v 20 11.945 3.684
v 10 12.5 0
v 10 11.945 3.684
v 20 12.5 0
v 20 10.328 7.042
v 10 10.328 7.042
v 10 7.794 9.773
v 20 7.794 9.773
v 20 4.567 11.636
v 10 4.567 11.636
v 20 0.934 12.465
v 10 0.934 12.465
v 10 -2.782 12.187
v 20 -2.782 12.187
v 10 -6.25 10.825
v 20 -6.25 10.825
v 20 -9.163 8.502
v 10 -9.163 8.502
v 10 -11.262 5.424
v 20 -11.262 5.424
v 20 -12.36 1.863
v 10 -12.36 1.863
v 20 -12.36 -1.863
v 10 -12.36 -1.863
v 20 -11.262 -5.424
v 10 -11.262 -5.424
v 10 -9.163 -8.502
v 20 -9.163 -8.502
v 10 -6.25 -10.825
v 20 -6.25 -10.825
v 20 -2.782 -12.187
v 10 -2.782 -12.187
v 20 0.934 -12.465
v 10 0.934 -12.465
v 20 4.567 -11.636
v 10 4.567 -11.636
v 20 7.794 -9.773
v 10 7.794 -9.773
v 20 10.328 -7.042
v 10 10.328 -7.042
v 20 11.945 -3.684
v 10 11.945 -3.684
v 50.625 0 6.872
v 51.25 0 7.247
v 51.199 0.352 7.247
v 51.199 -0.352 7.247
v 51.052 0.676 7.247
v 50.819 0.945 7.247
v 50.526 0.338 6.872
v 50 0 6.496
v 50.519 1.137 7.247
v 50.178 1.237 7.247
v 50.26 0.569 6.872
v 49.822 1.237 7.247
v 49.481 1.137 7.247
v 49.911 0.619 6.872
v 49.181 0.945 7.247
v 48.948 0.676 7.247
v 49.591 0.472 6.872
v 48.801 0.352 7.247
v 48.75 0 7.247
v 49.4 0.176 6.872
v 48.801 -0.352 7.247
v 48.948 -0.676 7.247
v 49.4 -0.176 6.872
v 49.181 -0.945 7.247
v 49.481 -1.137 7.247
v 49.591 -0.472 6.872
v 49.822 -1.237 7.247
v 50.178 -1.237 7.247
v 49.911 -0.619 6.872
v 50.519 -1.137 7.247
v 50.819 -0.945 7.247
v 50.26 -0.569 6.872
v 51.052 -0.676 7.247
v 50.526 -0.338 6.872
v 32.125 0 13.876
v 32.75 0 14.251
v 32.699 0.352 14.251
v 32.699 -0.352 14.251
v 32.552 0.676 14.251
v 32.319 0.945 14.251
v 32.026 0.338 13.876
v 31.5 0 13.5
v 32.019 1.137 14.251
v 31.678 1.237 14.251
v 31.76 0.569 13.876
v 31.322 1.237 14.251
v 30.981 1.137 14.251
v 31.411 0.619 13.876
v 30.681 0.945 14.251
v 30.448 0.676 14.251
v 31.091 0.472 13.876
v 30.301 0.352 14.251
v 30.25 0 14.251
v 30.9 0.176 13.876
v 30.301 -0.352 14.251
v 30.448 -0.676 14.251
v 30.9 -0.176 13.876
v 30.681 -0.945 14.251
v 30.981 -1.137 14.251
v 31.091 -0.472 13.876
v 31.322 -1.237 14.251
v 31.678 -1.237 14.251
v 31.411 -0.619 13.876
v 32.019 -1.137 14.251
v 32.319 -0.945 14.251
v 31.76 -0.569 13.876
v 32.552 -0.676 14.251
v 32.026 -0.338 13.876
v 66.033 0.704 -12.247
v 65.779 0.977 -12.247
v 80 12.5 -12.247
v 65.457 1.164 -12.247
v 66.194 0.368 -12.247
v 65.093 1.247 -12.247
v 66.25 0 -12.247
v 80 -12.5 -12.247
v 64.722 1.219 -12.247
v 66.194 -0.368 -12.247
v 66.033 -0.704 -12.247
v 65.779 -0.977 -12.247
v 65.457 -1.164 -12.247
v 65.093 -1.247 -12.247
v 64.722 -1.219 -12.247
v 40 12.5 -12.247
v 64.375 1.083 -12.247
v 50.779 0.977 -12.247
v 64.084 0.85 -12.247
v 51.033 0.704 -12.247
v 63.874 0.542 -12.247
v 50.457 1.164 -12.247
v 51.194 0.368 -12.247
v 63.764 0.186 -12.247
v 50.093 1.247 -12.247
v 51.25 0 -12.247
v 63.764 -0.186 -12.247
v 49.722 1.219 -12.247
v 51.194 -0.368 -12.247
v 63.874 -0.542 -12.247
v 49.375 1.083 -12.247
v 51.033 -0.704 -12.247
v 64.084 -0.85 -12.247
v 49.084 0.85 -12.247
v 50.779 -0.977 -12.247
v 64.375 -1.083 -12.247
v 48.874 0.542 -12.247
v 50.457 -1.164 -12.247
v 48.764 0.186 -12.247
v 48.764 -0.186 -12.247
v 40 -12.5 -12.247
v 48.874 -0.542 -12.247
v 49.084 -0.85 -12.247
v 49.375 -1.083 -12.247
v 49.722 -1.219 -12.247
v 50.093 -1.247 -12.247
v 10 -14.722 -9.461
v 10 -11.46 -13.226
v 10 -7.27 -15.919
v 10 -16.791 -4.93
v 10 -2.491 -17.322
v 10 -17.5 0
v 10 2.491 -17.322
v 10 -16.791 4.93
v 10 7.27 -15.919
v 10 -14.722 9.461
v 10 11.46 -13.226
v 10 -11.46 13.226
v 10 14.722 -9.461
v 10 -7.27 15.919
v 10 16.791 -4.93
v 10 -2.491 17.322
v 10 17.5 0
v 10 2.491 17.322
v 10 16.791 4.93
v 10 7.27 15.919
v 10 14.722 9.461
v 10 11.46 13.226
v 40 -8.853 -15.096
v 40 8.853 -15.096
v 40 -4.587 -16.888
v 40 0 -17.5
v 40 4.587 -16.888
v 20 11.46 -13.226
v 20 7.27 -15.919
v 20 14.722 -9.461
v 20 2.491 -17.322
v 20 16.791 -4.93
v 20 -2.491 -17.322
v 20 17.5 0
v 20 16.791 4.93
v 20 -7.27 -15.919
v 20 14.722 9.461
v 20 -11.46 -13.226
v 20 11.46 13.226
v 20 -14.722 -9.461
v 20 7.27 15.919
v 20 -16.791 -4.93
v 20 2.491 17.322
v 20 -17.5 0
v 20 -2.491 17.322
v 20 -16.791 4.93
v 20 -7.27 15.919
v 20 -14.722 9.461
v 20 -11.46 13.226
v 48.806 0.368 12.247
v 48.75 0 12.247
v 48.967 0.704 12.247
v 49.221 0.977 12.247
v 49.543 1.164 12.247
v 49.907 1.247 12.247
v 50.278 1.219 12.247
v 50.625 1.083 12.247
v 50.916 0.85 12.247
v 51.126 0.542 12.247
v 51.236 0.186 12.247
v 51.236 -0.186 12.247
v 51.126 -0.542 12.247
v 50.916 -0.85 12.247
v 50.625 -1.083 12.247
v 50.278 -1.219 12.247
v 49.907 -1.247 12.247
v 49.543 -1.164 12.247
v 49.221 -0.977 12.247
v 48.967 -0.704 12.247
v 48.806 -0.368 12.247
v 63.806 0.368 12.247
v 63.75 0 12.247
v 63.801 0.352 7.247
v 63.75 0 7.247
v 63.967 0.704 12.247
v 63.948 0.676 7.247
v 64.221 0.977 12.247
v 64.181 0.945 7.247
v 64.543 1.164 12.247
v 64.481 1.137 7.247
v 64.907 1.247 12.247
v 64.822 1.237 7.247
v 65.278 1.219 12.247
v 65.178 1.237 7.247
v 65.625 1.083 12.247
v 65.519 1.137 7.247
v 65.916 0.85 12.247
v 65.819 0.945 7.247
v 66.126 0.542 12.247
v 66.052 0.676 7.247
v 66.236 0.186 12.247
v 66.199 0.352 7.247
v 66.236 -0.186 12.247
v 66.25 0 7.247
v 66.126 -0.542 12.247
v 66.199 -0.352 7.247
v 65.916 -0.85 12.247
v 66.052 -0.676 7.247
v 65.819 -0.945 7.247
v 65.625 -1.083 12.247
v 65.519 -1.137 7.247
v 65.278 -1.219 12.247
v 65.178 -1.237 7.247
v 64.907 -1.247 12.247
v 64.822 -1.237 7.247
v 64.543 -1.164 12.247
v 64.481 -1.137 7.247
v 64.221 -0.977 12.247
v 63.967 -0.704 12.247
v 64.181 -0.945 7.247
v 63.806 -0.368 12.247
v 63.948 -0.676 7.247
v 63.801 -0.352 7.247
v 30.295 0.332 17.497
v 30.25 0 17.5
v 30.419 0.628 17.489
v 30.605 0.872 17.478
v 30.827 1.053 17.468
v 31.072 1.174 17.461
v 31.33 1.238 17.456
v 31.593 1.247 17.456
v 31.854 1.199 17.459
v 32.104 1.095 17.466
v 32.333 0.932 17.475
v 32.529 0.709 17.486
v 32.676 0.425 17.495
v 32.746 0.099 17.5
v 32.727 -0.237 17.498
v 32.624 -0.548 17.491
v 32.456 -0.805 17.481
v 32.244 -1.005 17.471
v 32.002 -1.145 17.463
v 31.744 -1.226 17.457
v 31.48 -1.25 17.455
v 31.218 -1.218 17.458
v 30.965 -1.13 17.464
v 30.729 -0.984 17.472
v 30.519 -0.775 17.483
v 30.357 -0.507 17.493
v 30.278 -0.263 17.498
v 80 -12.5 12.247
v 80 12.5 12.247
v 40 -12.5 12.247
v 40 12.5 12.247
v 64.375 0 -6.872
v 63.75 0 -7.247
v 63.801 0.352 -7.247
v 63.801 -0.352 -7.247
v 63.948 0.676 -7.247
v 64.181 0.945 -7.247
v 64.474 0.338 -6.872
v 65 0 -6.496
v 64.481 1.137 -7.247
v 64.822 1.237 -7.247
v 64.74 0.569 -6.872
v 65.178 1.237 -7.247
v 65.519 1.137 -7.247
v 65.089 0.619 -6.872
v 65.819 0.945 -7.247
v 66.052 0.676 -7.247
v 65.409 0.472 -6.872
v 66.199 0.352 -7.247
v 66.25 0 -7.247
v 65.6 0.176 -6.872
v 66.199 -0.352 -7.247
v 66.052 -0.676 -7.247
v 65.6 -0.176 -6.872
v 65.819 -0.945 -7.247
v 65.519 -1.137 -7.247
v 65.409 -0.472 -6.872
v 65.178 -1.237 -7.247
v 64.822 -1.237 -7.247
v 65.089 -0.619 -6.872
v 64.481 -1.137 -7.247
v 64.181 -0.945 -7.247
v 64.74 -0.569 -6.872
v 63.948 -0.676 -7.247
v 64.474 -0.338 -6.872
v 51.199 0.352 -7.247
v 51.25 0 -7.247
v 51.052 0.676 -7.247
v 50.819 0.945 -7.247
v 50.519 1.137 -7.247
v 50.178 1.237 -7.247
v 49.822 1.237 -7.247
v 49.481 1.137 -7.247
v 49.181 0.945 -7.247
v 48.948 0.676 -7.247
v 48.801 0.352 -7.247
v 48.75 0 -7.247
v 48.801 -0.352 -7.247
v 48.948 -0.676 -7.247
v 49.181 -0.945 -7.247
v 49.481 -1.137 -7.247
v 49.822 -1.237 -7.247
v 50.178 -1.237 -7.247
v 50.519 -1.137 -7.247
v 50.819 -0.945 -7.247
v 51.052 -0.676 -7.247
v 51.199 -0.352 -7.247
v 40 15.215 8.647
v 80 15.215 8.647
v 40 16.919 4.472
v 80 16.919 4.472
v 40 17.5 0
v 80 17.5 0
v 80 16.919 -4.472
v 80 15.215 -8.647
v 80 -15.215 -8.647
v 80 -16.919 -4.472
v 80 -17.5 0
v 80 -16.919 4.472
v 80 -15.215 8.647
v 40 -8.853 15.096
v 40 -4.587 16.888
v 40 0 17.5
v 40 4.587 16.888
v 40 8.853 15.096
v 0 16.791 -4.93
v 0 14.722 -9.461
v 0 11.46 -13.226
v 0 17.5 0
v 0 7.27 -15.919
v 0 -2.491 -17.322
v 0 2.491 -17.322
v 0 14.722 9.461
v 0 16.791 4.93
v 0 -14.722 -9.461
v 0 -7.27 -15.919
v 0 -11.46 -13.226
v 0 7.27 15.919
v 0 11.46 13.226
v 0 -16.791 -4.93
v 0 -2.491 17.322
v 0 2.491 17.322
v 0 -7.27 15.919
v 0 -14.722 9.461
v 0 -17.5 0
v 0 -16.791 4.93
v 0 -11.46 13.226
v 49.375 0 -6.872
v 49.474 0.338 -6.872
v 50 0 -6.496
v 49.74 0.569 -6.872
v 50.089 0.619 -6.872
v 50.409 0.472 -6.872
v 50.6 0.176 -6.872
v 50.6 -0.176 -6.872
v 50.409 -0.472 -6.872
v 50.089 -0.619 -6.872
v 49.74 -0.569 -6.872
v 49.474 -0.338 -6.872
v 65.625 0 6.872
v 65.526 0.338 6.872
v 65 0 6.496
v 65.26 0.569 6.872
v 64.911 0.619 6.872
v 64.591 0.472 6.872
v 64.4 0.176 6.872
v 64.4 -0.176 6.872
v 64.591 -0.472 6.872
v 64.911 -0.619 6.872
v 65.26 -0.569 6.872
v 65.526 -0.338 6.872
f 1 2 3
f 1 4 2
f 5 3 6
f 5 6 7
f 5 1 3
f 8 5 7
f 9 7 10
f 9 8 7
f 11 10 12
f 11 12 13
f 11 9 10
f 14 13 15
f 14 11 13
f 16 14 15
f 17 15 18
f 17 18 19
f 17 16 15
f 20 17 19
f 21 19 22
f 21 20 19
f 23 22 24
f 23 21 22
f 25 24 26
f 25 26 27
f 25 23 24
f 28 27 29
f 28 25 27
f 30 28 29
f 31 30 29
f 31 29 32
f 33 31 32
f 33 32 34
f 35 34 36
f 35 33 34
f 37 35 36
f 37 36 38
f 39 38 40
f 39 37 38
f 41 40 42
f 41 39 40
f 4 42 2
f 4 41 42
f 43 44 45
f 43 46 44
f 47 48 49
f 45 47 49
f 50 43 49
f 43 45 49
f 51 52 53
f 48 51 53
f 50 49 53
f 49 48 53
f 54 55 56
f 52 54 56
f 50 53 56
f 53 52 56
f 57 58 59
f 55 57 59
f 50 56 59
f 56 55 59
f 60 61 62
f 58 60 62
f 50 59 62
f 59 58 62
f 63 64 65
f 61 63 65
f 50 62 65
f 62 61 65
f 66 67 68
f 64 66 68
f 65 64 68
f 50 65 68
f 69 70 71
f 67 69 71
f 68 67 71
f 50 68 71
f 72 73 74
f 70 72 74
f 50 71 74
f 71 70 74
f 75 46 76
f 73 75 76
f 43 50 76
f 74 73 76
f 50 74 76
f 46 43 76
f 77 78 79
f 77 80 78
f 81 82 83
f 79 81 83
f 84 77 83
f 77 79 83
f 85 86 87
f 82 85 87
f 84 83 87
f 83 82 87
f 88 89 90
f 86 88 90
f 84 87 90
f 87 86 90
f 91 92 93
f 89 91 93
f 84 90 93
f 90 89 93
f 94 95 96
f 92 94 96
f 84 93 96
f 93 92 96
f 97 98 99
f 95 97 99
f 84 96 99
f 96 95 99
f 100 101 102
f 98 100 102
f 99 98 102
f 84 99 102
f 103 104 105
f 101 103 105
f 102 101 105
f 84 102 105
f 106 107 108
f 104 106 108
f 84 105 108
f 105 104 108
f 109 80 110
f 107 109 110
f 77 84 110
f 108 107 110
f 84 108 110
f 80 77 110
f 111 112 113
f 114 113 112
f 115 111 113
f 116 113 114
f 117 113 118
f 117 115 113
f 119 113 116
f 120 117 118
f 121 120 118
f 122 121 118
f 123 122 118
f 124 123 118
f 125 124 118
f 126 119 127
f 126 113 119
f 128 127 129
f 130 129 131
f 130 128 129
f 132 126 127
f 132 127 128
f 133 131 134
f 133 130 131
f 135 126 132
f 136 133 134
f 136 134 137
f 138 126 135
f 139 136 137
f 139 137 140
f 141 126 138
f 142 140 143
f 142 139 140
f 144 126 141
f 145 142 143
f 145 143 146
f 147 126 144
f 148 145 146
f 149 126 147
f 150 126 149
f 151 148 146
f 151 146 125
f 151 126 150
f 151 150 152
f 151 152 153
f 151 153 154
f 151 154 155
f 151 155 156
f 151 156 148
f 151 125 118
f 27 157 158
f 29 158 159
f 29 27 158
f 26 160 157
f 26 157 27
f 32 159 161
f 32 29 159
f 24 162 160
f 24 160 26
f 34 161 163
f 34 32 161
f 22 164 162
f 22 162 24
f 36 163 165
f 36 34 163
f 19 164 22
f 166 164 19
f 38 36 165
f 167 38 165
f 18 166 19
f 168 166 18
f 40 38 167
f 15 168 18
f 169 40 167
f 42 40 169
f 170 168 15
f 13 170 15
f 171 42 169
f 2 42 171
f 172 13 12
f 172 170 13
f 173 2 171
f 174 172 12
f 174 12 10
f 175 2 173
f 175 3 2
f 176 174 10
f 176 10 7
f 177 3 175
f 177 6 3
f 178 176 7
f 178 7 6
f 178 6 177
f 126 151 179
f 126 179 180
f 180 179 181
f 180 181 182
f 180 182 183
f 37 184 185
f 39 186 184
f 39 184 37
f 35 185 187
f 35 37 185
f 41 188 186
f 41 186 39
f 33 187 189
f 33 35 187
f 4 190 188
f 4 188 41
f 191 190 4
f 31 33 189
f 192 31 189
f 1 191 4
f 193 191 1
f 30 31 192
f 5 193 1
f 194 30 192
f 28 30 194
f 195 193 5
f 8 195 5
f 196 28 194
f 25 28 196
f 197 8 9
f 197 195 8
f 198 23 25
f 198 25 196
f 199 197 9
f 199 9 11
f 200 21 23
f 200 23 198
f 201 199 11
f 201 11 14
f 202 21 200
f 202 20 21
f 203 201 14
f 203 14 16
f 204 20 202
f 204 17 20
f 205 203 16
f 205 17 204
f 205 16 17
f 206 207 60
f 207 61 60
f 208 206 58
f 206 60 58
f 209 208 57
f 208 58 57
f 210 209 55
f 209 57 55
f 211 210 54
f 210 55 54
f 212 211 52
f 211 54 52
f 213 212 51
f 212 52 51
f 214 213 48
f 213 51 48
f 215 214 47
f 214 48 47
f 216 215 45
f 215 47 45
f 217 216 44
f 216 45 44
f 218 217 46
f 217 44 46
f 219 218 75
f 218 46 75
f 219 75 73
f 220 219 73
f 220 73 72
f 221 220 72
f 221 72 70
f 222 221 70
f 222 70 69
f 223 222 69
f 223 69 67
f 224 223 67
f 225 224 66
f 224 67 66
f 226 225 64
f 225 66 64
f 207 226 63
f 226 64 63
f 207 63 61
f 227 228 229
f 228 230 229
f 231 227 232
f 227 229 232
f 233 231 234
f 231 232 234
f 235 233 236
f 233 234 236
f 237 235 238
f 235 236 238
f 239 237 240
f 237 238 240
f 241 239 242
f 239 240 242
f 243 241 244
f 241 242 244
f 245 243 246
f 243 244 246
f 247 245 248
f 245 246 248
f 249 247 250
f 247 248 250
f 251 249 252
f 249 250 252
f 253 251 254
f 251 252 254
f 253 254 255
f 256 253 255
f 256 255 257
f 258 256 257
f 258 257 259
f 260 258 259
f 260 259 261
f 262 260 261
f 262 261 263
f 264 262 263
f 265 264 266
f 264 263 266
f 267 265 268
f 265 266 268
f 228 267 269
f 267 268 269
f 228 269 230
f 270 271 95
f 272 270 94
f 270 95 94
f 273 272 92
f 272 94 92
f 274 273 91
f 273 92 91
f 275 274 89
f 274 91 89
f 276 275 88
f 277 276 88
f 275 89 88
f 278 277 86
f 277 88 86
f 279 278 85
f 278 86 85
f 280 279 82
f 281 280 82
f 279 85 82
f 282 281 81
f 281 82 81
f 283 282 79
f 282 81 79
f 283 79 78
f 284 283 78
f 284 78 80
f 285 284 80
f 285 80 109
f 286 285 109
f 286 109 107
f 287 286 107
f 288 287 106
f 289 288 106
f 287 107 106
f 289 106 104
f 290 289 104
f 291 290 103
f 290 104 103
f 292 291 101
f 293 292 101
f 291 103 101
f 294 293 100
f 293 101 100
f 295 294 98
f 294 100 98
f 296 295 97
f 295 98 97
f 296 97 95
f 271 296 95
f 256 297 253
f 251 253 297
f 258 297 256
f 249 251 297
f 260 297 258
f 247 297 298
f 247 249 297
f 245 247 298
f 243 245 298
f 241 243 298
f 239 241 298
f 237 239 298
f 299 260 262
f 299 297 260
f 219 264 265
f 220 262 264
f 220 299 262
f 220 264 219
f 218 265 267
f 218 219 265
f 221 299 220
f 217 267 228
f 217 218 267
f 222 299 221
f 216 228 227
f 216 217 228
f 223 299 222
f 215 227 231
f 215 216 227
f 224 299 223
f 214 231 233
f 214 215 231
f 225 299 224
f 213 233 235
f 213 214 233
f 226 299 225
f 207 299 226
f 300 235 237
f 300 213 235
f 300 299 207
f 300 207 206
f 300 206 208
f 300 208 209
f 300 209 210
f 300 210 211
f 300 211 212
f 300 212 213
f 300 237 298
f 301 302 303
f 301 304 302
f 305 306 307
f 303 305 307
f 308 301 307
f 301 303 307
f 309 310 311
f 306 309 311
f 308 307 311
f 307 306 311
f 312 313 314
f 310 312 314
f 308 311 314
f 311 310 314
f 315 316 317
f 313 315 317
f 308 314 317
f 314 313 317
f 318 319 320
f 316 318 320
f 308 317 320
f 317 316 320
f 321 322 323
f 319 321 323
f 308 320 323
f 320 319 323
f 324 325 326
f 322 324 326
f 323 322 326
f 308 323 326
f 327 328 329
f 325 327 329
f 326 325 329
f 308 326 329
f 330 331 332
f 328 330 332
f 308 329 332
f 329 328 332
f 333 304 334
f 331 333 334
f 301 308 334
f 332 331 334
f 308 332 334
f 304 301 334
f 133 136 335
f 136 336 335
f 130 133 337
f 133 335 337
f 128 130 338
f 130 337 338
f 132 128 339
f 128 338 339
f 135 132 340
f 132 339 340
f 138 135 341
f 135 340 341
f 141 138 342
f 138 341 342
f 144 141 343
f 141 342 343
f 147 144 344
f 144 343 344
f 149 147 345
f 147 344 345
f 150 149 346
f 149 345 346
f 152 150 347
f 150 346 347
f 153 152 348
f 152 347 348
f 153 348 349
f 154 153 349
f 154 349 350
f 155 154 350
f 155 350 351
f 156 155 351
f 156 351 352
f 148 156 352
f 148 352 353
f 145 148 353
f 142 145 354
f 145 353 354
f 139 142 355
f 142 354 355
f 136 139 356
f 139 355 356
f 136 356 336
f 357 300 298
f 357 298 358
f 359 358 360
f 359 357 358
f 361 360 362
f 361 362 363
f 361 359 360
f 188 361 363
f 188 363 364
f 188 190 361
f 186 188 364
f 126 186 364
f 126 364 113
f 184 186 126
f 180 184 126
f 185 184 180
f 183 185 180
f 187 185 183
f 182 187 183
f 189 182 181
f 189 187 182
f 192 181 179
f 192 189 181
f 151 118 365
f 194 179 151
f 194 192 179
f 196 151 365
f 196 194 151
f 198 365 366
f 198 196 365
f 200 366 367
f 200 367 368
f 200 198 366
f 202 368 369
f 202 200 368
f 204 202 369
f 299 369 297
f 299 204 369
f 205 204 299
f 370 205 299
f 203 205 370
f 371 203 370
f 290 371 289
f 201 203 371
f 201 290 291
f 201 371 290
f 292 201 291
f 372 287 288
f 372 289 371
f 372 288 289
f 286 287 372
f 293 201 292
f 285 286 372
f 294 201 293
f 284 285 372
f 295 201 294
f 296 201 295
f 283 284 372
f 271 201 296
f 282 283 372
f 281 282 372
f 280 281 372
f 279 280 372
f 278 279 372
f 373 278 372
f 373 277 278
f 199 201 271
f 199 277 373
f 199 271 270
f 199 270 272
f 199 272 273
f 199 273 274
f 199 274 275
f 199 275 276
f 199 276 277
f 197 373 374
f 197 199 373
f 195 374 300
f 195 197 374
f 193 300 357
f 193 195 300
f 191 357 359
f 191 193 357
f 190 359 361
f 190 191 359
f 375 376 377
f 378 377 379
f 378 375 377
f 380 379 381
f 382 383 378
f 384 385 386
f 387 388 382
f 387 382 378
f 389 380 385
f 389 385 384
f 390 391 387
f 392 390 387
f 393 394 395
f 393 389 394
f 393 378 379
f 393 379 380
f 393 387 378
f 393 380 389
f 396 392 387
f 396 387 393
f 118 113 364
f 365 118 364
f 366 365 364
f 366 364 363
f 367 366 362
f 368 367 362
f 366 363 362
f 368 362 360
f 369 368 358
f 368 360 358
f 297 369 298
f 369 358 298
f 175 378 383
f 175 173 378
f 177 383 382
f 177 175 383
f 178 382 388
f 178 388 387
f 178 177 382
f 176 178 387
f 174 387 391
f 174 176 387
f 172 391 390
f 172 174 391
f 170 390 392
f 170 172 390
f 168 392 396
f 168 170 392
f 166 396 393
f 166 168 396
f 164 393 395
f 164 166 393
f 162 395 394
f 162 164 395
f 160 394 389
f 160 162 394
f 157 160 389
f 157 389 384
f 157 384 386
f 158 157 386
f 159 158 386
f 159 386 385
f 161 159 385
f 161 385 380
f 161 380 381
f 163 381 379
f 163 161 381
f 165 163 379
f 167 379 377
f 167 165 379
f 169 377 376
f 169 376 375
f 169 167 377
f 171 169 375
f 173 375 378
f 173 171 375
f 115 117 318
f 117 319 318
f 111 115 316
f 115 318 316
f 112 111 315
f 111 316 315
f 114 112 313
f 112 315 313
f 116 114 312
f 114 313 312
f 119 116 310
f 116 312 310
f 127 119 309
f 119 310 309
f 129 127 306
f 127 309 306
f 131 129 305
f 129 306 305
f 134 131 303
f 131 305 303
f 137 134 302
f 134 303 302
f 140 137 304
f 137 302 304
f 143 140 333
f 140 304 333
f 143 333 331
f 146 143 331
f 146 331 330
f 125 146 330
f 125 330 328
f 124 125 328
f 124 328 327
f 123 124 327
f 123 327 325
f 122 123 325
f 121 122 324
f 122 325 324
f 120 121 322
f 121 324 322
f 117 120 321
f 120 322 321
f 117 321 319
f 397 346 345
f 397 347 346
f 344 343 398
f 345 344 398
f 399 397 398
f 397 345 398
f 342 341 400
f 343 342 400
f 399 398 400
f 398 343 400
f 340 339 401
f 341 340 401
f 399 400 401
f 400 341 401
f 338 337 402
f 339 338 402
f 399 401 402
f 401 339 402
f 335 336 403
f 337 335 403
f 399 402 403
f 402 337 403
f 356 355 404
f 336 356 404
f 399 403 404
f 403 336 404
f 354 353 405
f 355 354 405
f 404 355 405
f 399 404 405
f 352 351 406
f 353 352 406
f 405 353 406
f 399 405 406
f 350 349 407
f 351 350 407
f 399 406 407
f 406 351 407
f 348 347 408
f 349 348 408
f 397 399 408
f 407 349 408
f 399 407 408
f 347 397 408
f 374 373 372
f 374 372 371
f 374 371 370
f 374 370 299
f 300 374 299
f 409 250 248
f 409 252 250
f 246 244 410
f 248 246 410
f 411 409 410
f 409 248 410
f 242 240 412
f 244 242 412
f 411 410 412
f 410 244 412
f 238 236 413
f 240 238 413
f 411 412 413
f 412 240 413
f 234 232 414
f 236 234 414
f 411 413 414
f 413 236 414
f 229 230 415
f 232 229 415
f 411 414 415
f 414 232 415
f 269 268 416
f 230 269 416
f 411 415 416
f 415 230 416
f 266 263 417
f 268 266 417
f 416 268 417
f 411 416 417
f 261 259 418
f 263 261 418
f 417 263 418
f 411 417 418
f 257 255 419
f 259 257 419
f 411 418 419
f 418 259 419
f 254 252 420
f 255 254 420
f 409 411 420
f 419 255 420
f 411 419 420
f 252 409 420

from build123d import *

# Parameters (mm, degrees)
M3X0_5_TAPPED_HOLE1_D               = 2.5
M3X0_5_TAPPED_HOLE1_DEPTH           = 3.248924226
M3X0_5_TAPPED_HOLE1_TIP             = 0.751075774
BOSS_EXTRUDE1_DEPTH                 = 40
M3X0_5_TAPPED_HOLE2_D               = 2.5
M3X0_5_TAPPED_HOLE2_DEPTH           = 5
M3X0_5_TAPPED_HOLE2_TIP             = 0.751075774
M3X0_5_TAPPED_HOLE2_ON_FACE_2_D     = 2.5
M3X0_5_TAPPED_HOLE2_ON_FACE_2_DEPTH = 5
M3X0_5_TAPPED_HOLE2_ON_FACE_2_TIP   = 0.751075774


with BuildPart() as part:
    # Sketch1 → Revolve1 (revolve)
    with BuildSketch(Plane.XY):
        Polygon((0, 0), (0, 17.5), (10, 17.5), (10, 12.5), (20, 12.5), (20, 17.5), (40, 17.5), (40, 0), align=None)
    revolve(axis=Axis((0, 0, 0), (1, 0, 0)))

    # M3x0.5 Tapped Hole1
    with Locations(Plane(origin=(31.5, 0, 17.5), x_dir=(1, 0, 0), z_dir=(0, 0, 1))):
        with Locations((0, 0)):
            Hole(M3X0_5_TAPPED_HOLE1_D / 2, depth=M3X0_5_TAPPED_HOLE1_DEPTH)
            with Locations((0, 0, -(M3X0_5_TAPPED_HOLE1_DEPTH + M3X0_5_TAPPED_HOLE1_TIP / 2))):  # 118° drill point
                Cone(0, M3X0_5_TAPPED_HOLE1_D / 2, M3X0_5_TAPPED_HOLE1_TIP, mode=Mode.SUBTRACT)

    # Sketch3 → Boss-Extrude1 (add)
    with BuildSketch(Plane(origin=(40, 0, 0), x_dir=(0, 0, -1), z_dir=(1, 0, 0))):
        with BuildLine():
            Line((-12.247448714, -12.5), (-12.247448714, 12.5))
            ThreePointArc((-12.247448714, 12.5), (0, 17.5), (12.247448714, 12.5))
            Line((12.247448714, 12.5), (12.247448714, -12.5))
            ThreePointArc((12.247448714, -12.5), (0, -17.5), (-12.247448714, -12.5))
        make_face()
    extrude(amount=BOSS_EXTRUDE1_DEPTH)

    # M3x0.5 Tapped Hole2
    with Locations(Plane(origin=(50, 0, 12.247448714), x_dir=(1, 0, 0), z_dir=(0, 0, 1))):
        with Locations((0, 0), (15, 0)):
            Hole(M3X0_5_TAPPED_HOLE2_D / 2, depth=M3X0_5_TAPPED_HOLE2_DEPTH)
            with Locations((0, 0, -(M3X0_5_TAPPED_HOLE2_DEPTH + M3X0_5_TAPPED_HOLE2_TIP / 2))):  # 118° drill point
                Cone(0, M3X0_5_TAPPED_HOLE2_D / 2, M3X0_5_TAPPED_HOLE2_TIP, mode=Mode.SUBTRACT)

    # M3x0.5 Tapped Hole2 on face 2
    with Locations(Plane(origin=(65, 0, -12.247448714), x_dir=(-1, 0, 0), z_dir=(0, 0, -1))):
        with Locations((0, 0), (15, 0)):
            Hole(M3X0_5_TAPPED_HOLE2_ON_FACE_2_D / 2, depth=M3X0_5_TAPPED_HOLE2_ON_FACE_2_DEPTH)
            with Locations((0, 0, -(M3X0_5_TAPPED_HOLE2_ON_FACE_2_DEPTH + M3X0_5_TAPPED_HOLE2_ON_FACE_2_TIP / 2))):  # 118° drill point
                Cone(0, M3X0_5_TAPPED_HOLE2_ON_FACE_2_D / 2, M3X0_5_TAPPED_HOLE2_ON_FACE_2_TIP, mode=Mode.SUBTRACT)


solid = part.part
